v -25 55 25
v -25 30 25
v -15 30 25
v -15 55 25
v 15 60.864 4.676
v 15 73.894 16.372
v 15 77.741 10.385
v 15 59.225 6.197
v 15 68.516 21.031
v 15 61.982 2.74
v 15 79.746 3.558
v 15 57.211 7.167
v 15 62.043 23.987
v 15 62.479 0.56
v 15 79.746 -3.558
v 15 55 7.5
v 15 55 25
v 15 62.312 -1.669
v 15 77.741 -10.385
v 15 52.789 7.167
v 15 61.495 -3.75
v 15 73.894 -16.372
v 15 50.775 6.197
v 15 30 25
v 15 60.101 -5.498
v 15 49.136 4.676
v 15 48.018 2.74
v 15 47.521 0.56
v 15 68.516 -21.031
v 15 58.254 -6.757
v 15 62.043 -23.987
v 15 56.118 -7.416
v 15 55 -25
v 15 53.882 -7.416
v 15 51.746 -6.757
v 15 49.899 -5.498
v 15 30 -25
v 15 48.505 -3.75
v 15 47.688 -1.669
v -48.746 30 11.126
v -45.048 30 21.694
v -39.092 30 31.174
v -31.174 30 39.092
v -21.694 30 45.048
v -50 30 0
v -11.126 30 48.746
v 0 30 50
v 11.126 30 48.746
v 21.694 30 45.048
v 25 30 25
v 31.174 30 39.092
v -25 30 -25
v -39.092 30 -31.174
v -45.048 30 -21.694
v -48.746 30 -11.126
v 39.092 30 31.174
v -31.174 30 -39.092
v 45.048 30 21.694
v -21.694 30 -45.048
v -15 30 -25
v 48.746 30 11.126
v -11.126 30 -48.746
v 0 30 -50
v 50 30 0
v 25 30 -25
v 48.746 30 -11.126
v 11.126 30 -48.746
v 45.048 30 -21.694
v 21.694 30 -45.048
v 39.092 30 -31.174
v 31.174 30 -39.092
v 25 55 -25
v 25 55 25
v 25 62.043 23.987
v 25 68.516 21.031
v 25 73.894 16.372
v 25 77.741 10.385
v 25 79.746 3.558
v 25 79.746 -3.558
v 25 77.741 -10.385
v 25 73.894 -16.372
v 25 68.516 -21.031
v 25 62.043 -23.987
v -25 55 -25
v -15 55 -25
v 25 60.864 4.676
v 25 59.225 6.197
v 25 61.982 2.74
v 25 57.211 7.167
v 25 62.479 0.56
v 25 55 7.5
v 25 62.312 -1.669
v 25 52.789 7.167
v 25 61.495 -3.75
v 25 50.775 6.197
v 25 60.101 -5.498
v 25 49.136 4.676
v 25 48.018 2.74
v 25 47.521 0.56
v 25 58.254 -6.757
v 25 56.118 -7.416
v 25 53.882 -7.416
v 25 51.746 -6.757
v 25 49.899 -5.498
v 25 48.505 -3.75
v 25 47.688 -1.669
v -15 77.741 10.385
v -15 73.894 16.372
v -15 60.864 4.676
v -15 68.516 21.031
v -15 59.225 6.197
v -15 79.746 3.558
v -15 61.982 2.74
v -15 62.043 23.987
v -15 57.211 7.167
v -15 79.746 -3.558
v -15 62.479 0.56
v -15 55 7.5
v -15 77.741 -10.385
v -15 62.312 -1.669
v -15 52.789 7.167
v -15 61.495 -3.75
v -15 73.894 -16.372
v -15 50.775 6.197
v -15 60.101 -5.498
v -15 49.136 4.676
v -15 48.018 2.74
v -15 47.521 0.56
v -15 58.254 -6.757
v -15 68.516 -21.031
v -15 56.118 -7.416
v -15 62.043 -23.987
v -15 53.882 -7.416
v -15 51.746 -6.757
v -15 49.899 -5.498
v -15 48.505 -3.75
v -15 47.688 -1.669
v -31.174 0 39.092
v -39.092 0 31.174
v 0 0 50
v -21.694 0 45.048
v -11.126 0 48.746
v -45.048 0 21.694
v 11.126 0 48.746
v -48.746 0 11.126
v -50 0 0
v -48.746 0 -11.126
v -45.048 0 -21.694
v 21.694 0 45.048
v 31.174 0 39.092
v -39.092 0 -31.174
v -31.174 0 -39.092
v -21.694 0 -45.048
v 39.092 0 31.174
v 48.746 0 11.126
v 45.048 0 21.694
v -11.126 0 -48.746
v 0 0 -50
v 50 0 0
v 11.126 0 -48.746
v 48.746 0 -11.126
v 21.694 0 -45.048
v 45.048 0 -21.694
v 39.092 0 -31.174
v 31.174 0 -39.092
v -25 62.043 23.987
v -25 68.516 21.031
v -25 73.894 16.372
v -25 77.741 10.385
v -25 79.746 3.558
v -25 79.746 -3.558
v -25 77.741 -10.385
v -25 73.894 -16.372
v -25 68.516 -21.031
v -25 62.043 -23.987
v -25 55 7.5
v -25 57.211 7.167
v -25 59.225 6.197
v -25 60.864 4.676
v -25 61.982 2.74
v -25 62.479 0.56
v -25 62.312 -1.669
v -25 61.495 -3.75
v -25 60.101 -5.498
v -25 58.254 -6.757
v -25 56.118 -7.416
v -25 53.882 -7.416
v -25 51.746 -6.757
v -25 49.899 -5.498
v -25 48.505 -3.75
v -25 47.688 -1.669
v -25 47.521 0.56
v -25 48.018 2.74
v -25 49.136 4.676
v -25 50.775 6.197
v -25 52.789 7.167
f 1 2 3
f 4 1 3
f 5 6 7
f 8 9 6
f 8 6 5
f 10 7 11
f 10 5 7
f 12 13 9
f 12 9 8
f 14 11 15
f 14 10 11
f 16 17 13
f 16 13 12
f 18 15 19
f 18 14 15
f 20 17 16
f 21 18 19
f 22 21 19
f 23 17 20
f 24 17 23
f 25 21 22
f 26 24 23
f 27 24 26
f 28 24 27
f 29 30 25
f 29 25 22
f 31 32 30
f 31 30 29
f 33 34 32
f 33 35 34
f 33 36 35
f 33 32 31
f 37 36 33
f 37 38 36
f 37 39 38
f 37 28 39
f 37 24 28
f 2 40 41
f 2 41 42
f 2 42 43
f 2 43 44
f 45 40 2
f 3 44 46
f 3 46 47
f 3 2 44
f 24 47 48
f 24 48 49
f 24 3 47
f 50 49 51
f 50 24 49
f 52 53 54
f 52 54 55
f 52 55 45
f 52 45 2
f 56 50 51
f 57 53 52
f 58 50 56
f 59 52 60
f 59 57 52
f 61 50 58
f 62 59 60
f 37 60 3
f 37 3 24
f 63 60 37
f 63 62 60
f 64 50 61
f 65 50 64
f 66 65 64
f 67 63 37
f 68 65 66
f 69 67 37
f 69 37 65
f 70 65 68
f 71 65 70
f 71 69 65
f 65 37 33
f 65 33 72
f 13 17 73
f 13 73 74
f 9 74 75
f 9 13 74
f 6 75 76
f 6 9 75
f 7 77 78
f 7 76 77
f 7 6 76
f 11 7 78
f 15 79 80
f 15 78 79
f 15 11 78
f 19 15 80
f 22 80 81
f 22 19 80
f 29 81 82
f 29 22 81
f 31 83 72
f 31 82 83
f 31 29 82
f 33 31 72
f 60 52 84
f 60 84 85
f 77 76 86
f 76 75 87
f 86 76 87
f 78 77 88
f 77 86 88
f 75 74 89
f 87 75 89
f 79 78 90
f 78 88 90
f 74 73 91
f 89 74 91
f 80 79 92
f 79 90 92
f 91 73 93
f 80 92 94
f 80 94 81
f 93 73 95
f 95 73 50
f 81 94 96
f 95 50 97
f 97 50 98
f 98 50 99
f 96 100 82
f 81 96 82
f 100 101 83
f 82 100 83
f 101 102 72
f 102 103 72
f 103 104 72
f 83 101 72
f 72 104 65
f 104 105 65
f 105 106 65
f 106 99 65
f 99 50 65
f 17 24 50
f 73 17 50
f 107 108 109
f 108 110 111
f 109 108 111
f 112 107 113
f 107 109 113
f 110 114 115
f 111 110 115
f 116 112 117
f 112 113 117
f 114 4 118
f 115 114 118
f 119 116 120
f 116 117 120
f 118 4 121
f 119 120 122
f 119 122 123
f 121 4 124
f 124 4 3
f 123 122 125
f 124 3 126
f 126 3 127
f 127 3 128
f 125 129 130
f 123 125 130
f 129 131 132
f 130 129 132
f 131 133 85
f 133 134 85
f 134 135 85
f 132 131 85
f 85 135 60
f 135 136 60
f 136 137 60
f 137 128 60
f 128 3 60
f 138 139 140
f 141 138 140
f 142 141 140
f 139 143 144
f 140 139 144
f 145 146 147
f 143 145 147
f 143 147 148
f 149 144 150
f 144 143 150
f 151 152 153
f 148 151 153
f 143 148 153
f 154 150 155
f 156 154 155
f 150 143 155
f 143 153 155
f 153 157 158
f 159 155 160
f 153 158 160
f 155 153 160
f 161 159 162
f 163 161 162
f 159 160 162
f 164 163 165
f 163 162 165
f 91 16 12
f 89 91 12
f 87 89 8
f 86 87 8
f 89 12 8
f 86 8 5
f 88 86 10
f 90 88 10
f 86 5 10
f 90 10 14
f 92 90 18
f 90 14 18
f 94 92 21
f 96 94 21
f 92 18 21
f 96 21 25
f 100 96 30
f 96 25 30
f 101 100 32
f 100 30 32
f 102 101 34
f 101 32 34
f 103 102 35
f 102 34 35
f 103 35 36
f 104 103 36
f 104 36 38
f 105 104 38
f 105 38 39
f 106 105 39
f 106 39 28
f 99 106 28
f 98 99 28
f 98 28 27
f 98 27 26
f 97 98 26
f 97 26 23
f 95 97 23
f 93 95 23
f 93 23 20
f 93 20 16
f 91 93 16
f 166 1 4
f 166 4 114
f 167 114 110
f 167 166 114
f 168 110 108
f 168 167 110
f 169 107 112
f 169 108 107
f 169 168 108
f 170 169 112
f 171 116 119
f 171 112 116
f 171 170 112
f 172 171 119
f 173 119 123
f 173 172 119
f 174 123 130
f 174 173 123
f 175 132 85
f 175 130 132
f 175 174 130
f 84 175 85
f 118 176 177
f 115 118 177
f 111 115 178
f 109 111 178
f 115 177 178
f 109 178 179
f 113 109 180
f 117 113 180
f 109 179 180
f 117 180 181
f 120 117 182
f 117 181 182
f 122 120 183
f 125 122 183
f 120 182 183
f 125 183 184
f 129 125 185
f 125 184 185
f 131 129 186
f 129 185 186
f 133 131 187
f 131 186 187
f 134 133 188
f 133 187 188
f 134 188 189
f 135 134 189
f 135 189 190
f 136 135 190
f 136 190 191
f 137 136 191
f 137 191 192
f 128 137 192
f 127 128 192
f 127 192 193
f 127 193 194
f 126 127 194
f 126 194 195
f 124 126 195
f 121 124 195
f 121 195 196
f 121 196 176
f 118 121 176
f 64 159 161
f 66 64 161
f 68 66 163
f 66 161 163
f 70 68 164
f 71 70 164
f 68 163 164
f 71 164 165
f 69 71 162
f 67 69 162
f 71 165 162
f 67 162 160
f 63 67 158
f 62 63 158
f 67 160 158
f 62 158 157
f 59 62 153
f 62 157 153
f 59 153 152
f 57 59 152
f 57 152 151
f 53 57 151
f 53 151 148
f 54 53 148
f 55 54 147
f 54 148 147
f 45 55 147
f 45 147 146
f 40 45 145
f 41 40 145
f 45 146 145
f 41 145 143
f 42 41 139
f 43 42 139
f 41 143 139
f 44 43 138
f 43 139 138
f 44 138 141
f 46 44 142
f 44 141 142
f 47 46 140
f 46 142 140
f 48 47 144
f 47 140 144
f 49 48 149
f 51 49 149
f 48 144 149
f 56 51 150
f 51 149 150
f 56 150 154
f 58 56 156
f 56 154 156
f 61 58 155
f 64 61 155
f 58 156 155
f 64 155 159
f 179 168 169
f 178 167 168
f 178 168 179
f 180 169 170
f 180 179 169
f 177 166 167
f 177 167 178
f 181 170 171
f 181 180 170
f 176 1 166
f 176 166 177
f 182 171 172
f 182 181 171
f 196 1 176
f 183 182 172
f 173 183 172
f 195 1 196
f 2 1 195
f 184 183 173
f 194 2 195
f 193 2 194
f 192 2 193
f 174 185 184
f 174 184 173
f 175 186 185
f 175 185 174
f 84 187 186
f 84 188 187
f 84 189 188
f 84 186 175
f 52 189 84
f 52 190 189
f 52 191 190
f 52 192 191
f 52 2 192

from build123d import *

# Parameters (mm, degrees)
SKETCH1_R           = 50
BOSS_EXTRUDE1_DEPTH = 30
SKETCH2_W           = 10
SKETCH2_H           = 50
BOSS_EXTRUDE2_DEPTH = 50
CUT_EXTRUDE2_DEPTH  = 50
SKETCH5_R           = 7.5
CUT_EXTRUDE3_DEPTH  = 50


with BuildPart() as part:
    # Sketch1 → Boss-Extrude1 (new body)
    with BuildSketch(Plane(origin=(0, 0, 0), x_dir=(1, 0, 0), z_dir=(0, 1, 0))):
        Circle(SKETCH1_R)
    extrude(amount=BOSS_EXTRUDE1_DEPTH)

    # Sketch2 → Boss-Extrude2 (add)
    with BuildSketch(Plane(origin=(0, 30, 0), x_dir=(1, 0, 0), z_dir=(0, 1, 0))):
        with Locations((-20, 0)):
            Rectangle(SKETCH2_W, SKETCH2_H)
        with Locations((20, 0)):
            Rectangle(SKETCH2_W, SKETCH2_H)
    extrude(amount=BOSS_EXTRUDE2_DEPTH)

    # Sketch4 → Cut-Extrude2 (cut)
    with BuildSketch(Plane.ZY.offset(25)):
        with BuildLine():
            Line((30.852726851, 88.254535322), (30.852726851, 55))
            Line((30.852726851, 55), (25, 55))
            ThreePointArc((25, 55), (0, 80), (-25, 55))
            Line((-25, 55), (-34.201839493, 55))
            Line((-34.201839493, 55), (-34.201839493, 88.254535322))
            Line((-34.201839493, 88.254535322), (30.852726851, 88.254535322))
        make_face()
    extrude(amount=-CUT_EXTRUDE2_DEPTH, mode=Mode.SUBTRACT)

    # Sketch5 → Cut-Extrude3 (cut)
    with BuildSketch(Plane.ZY.offset(25)):
        with Locations((0, 55)):
            Circle(SKETCH5_R)
    extrude(amount=-CUT_EXTRUDE3_DEPTH, mode=Mode.SUBTRACT)


solid = part.part
